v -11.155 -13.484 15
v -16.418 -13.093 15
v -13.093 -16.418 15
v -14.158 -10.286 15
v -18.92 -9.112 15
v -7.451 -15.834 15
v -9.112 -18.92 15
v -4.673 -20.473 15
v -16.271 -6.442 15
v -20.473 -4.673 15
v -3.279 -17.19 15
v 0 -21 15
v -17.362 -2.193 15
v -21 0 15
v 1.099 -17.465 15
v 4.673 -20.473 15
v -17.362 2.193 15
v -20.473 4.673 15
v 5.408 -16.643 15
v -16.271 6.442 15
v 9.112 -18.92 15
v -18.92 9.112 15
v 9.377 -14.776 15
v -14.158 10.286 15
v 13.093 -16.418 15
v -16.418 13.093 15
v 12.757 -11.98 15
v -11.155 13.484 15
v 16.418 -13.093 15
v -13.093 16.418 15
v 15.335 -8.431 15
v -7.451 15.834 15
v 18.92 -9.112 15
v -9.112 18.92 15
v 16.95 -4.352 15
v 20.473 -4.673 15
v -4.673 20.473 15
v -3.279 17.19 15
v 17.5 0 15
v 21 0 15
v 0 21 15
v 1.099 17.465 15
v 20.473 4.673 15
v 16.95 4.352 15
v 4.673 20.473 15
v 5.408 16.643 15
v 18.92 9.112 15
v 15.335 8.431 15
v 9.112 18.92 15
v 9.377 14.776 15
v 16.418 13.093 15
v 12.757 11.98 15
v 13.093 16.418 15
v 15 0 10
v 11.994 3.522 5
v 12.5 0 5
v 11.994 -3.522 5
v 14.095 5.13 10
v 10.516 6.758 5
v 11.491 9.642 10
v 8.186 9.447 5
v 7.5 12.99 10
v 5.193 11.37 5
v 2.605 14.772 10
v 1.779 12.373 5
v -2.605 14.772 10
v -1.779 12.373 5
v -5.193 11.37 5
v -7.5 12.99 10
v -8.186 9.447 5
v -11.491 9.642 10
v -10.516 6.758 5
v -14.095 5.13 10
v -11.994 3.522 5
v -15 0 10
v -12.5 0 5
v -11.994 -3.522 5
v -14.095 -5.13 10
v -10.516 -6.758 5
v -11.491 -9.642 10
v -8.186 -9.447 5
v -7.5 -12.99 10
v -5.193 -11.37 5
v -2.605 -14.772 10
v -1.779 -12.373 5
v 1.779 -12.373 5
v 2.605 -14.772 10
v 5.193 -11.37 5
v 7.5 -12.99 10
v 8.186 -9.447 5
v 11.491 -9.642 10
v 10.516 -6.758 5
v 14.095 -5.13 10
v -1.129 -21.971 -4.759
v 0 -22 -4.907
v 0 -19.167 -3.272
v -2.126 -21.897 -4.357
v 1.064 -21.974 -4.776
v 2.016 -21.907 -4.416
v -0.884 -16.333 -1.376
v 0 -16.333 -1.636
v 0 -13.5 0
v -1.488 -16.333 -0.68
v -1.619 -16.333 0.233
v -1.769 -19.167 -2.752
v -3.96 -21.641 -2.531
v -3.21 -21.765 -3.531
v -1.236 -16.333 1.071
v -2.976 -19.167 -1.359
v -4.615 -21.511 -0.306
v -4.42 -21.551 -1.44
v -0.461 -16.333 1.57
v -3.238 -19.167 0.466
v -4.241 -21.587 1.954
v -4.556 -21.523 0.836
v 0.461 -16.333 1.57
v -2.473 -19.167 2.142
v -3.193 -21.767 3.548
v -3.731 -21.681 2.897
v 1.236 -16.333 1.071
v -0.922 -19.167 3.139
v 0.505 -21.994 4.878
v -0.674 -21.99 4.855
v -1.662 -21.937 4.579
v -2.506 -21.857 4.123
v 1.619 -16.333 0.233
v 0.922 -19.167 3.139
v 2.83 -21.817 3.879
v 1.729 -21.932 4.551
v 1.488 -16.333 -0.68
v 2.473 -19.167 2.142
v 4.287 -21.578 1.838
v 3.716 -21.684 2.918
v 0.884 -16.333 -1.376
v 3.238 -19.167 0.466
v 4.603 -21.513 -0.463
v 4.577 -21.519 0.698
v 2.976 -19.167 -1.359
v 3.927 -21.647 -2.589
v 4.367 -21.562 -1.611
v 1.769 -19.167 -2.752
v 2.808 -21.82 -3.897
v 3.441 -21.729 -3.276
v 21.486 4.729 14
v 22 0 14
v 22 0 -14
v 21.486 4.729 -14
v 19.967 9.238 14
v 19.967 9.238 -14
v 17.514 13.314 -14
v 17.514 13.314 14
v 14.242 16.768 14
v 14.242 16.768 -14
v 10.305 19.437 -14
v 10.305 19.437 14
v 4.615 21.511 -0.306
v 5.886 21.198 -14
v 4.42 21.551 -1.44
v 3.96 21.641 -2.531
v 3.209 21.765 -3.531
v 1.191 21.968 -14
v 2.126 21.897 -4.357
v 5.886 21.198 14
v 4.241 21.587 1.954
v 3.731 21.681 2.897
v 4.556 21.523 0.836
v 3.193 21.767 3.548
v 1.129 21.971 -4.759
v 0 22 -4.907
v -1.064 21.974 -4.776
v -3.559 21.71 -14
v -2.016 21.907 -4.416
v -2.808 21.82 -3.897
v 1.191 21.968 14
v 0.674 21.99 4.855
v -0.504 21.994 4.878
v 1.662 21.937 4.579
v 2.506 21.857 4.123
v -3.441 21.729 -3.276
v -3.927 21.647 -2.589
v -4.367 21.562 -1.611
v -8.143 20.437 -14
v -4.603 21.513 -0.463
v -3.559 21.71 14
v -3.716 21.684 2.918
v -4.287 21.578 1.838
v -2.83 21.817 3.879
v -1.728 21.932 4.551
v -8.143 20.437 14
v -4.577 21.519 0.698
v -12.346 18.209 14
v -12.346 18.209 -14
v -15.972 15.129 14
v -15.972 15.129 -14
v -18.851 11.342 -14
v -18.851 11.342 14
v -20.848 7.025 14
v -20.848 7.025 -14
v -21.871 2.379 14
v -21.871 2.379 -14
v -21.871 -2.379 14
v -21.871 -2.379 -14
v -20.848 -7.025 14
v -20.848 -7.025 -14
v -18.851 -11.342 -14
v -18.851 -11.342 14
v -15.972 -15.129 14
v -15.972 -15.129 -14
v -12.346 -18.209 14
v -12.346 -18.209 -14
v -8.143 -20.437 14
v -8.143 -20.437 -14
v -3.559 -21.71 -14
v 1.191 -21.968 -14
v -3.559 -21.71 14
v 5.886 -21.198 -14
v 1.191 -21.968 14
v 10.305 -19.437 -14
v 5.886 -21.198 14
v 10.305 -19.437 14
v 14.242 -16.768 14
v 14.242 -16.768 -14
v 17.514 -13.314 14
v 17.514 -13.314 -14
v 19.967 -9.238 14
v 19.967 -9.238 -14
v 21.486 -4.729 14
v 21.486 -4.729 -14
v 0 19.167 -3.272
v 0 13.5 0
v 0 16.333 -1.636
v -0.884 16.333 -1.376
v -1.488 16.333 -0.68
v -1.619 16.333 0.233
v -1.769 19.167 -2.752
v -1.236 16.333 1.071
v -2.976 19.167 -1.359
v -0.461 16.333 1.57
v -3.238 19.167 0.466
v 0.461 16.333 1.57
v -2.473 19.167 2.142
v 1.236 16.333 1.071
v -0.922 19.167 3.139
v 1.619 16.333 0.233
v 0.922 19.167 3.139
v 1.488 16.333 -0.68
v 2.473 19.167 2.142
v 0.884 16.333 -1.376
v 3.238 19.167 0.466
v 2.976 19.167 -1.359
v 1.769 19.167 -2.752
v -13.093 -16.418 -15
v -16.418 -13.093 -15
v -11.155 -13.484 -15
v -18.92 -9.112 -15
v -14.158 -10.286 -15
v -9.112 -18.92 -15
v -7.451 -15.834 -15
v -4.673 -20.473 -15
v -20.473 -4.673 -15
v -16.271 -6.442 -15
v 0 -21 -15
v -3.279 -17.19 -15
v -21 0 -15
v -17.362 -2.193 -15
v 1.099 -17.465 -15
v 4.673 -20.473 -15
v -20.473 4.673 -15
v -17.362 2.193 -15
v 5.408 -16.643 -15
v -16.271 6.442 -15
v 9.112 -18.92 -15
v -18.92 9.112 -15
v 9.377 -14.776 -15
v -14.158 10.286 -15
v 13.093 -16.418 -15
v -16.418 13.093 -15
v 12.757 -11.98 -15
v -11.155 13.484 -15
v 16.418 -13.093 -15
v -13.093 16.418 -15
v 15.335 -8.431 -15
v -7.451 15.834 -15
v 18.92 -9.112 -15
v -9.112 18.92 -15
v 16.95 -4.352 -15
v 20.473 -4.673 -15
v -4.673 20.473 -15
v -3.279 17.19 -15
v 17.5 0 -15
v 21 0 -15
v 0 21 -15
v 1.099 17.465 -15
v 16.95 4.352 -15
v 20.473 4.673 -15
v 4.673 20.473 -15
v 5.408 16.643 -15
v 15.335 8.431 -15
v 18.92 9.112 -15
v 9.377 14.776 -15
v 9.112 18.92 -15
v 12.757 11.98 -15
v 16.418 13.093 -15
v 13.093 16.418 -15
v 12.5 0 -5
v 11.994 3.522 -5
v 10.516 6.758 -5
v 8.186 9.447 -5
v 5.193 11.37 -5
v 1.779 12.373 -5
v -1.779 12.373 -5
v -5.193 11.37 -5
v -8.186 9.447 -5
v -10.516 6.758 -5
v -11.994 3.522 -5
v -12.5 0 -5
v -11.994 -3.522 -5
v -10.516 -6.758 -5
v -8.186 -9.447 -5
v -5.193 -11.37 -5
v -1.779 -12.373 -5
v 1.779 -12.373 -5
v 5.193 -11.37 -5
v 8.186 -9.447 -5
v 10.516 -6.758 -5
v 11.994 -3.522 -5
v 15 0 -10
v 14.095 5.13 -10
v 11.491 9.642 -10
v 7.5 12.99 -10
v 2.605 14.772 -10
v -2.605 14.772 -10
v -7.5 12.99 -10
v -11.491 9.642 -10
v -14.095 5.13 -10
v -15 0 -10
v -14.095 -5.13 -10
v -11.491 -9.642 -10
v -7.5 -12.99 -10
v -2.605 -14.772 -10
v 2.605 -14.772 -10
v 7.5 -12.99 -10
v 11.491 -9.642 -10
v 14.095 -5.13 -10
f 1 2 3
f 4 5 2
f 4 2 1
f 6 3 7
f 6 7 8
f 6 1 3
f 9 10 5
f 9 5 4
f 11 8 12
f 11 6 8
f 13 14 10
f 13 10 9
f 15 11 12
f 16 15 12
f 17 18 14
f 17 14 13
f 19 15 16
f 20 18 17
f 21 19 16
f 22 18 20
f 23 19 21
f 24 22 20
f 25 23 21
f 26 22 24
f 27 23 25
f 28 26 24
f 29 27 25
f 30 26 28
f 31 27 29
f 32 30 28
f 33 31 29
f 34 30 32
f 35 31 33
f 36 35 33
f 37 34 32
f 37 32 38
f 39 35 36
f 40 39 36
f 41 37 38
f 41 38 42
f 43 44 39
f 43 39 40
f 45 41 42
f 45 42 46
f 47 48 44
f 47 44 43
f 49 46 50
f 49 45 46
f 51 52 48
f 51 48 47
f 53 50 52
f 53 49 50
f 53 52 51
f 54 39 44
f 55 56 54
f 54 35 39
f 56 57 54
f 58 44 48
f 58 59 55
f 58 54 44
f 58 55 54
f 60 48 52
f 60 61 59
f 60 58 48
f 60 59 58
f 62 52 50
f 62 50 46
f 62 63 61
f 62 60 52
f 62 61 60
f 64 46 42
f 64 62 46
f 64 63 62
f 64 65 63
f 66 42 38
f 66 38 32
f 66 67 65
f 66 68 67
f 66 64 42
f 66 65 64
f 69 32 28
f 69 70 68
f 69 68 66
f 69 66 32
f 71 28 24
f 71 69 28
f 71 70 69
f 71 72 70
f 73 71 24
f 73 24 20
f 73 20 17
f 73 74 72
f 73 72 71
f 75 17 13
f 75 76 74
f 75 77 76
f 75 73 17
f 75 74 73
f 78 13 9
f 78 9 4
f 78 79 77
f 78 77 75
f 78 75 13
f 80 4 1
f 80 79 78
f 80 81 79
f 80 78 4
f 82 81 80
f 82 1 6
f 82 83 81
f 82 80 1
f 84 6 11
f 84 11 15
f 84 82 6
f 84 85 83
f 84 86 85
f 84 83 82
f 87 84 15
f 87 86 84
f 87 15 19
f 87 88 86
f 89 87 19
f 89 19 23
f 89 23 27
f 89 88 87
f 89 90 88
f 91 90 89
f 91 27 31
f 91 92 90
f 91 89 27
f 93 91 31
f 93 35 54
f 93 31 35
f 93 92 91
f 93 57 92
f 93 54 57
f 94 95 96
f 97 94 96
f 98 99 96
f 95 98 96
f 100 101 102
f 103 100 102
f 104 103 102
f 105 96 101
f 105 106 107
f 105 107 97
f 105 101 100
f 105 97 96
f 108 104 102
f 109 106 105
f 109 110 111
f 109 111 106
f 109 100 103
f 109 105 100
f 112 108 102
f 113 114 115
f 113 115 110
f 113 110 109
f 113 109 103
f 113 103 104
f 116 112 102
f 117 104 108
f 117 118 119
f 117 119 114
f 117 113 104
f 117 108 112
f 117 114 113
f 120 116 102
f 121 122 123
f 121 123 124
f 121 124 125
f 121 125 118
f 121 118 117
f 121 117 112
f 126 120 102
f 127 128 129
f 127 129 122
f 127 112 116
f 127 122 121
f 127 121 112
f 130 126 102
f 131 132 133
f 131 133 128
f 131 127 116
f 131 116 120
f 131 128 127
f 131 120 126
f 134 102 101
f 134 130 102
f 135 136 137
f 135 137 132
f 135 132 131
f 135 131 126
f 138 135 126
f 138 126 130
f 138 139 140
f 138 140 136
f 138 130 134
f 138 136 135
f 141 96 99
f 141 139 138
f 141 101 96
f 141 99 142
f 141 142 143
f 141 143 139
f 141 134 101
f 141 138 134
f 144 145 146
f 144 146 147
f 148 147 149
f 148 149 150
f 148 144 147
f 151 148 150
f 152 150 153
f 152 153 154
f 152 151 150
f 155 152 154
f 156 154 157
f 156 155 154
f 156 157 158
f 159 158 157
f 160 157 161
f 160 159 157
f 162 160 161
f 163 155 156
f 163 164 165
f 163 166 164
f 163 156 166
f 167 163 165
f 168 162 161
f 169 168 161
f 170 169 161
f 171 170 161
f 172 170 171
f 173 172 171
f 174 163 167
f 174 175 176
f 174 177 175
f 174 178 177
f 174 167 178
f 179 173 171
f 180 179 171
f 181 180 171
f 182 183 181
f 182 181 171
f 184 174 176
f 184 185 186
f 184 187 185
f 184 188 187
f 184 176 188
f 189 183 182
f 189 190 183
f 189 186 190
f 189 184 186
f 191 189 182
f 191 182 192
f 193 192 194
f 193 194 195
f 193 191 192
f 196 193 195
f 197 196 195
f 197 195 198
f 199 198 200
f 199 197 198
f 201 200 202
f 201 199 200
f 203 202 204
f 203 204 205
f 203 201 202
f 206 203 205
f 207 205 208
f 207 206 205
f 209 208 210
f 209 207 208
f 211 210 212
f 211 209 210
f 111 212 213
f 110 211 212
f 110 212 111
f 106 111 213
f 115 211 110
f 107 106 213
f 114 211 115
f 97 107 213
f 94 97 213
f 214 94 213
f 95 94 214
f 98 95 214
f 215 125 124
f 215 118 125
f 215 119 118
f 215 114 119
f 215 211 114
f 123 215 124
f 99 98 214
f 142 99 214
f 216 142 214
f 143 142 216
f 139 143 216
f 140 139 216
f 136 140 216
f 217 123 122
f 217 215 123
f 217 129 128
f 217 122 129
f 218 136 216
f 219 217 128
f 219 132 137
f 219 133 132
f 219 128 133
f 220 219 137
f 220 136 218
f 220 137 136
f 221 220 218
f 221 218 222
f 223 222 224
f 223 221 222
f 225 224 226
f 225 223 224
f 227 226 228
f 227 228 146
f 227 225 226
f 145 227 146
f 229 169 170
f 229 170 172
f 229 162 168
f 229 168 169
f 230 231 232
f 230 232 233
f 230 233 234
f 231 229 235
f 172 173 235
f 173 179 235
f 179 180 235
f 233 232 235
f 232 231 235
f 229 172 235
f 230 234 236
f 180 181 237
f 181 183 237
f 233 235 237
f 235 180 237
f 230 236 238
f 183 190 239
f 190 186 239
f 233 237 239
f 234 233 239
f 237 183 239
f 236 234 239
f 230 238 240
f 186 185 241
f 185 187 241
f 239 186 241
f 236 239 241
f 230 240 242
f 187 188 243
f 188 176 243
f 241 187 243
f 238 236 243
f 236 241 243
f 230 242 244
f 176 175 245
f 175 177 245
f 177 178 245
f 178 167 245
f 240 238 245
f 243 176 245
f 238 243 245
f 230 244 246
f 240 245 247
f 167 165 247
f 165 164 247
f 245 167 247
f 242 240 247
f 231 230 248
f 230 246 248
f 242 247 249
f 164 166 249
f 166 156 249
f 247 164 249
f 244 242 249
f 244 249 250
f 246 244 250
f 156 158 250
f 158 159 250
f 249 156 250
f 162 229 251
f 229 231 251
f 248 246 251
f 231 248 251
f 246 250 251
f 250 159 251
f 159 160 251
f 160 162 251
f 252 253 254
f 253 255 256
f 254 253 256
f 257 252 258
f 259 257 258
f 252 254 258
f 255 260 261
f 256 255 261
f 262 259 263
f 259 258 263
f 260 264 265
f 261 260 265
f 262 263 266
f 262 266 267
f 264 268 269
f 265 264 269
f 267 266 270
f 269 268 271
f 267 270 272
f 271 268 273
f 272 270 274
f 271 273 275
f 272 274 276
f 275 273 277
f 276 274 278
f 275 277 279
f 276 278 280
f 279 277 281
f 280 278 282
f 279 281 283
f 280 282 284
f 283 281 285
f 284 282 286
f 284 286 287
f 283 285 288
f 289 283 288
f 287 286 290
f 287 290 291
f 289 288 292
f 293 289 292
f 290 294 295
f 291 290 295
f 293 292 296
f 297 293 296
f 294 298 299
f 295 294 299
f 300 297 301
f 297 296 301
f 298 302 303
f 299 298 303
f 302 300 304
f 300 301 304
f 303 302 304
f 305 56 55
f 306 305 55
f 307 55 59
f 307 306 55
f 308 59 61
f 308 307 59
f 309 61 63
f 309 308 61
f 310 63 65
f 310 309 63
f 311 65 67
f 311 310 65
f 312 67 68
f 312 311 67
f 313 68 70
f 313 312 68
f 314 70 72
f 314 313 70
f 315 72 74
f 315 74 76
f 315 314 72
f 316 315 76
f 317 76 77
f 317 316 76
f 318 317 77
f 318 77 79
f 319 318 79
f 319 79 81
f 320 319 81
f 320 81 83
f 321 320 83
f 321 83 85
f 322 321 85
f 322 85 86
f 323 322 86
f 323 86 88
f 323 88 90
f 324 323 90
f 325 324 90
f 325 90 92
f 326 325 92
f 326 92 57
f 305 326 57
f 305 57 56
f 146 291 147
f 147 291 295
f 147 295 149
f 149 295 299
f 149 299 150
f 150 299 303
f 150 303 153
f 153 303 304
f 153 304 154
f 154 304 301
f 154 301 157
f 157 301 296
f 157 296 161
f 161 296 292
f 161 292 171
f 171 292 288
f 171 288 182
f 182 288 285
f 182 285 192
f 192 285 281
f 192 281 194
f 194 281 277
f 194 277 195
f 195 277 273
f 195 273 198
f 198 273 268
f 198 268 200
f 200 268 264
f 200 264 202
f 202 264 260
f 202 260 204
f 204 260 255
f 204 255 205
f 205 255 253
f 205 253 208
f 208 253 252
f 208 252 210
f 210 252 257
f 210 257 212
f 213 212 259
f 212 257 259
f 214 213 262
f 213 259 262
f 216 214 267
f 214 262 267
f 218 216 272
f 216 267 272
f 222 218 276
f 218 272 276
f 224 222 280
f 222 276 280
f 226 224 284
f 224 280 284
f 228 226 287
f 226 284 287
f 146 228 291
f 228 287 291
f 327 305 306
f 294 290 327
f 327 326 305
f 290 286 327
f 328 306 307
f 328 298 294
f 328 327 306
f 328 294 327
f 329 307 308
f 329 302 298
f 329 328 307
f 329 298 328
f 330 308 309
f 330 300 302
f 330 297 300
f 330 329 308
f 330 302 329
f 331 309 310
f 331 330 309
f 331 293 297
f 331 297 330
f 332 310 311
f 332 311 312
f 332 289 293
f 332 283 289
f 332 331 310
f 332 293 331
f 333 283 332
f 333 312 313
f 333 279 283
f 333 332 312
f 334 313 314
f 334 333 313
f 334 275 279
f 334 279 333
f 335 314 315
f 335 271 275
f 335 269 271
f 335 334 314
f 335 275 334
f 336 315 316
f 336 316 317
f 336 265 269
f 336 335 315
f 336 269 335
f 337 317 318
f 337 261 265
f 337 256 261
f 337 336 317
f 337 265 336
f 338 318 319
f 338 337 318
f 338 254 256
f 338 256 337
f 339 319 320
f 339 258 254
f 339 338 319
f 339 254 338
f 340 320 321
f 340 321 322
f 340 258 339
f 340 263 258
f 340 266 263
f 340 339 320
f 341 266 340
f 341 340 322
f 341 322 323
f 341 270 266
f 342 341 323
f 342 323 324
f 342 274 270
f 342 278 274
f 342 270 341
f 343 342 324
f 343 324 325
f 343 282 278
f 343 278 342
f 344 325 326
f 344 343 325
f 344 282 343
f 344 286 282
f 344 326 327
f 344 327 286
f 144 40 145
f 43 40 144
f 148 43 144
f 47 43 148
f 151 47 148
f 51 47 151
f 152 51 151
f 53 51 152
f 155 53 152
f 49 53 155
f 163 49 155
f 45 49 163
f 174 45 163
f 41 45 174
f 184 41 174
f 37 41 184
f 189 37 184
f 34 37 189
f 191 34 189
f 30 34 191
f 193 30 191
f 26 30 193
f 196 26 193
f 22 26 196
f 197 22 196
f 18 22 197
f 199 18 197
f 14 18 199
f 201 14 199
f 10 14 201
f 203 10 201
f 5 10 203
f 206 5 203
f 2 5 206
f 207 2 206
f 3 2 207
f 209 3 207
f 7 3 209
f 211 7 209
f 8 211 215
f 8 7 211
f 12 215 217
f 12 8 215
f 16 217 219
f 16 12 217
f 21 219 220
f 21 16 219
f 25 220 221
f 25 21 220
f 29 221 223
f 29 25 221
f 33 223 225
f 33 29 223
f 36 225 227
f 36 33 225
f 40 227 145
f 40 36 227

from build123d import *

# Parameters (mm, degrees)
SKETCH1_R           = 22
SKETCH1_R_2         = 12.5
BOSS_EXTRUDE1_DEPTH = 15
CHAMFER1_SIZE       = 1
CHAMFER2_SIZE       = 5
CHAMFER2_SIZE2      = 10
CHAMFER3_SIZE       = 10
CHAMFER3_SIZE2      = 5


with BuildPart() as part:
    # Sketch1 → Boss-Extrude1 (new, symmetric)
    with BuildSketch(Plane.XY):
        Circle(SKETCH1_R)
        Circle(SKETCH1_R_2, mode=Mode.SUBTRACT)
    extrude(amount=BOSS_EXTRUDE1_DEPTH, both=True)

    # Chamfer1
    chamfer1_edges = [part.edges().sort_by_distance(p)[0] for p in [
        (-22, 0, -15),
        (-22, 0, 15),
    ]]
    chamfer(chamfer1_edges, length=CHAMFER1_SIZE)

    # Chamfer2
    chamfer2_edges = [part.edges().sort_by_distance(p)[0] for p in [
        (-12.5, 0, 15),
    ]]
    chamfer2_side = [part.faces().sort_by_distance(p)[0] for p in [
        (-20.406030304, 0, 15),
    ]]
    chamfer(chamfer2_edges, length=CHAMFER2_SIZE, length2=CHAMFER2_SIZE2, reference=chamfer2_side[0])

    # Chamfer3
    chamfer3_edges = [part.edges().sort_by_distance(p)[0] for p in [
        (-12.5, 0, -15),
    ]]
    chamfer3_side = [part.faces().sort_by_distance(p)[0] for p in [
        (-12.5, 0, -5),
    ]]
    chamfer(chamfer3_edges, length=CHAMFER3_SIZE, length2=CHAMFER3_SIZE2, reference=chamfer3_side[0])

    # Sketch2 → Cut-Revolve1 (revolve, cut)
    with BuildSketch(Plane(origin=(-103.136389545, -329.994936254, 0), x_dir=(-1, 0, 0), z_dir=(0, 0, 1)), mode=Mode.PRIVATE) as cut_revolve1_sk:
        Polygon((-103.136389545, -304.994936254), (-103.136389545, -316.494936254), (-96.496861449, -304.994936254), align=None)
    cut_revolve1 = revolve(cut_revolve1_sk.sketch.rotate(Axis((0, -25, 0), (0, 1, 0)), 270), axis=Axis((0, -25, 0), (0, 1, 0)), mode=Mode.SUBTRACT)

    # Mirror3: Cut-Revolve1 across plane
    add(cut_revolve1.mirror(Plane.ZX), mode=Mode.SUBTRACT)


solid = part.part
